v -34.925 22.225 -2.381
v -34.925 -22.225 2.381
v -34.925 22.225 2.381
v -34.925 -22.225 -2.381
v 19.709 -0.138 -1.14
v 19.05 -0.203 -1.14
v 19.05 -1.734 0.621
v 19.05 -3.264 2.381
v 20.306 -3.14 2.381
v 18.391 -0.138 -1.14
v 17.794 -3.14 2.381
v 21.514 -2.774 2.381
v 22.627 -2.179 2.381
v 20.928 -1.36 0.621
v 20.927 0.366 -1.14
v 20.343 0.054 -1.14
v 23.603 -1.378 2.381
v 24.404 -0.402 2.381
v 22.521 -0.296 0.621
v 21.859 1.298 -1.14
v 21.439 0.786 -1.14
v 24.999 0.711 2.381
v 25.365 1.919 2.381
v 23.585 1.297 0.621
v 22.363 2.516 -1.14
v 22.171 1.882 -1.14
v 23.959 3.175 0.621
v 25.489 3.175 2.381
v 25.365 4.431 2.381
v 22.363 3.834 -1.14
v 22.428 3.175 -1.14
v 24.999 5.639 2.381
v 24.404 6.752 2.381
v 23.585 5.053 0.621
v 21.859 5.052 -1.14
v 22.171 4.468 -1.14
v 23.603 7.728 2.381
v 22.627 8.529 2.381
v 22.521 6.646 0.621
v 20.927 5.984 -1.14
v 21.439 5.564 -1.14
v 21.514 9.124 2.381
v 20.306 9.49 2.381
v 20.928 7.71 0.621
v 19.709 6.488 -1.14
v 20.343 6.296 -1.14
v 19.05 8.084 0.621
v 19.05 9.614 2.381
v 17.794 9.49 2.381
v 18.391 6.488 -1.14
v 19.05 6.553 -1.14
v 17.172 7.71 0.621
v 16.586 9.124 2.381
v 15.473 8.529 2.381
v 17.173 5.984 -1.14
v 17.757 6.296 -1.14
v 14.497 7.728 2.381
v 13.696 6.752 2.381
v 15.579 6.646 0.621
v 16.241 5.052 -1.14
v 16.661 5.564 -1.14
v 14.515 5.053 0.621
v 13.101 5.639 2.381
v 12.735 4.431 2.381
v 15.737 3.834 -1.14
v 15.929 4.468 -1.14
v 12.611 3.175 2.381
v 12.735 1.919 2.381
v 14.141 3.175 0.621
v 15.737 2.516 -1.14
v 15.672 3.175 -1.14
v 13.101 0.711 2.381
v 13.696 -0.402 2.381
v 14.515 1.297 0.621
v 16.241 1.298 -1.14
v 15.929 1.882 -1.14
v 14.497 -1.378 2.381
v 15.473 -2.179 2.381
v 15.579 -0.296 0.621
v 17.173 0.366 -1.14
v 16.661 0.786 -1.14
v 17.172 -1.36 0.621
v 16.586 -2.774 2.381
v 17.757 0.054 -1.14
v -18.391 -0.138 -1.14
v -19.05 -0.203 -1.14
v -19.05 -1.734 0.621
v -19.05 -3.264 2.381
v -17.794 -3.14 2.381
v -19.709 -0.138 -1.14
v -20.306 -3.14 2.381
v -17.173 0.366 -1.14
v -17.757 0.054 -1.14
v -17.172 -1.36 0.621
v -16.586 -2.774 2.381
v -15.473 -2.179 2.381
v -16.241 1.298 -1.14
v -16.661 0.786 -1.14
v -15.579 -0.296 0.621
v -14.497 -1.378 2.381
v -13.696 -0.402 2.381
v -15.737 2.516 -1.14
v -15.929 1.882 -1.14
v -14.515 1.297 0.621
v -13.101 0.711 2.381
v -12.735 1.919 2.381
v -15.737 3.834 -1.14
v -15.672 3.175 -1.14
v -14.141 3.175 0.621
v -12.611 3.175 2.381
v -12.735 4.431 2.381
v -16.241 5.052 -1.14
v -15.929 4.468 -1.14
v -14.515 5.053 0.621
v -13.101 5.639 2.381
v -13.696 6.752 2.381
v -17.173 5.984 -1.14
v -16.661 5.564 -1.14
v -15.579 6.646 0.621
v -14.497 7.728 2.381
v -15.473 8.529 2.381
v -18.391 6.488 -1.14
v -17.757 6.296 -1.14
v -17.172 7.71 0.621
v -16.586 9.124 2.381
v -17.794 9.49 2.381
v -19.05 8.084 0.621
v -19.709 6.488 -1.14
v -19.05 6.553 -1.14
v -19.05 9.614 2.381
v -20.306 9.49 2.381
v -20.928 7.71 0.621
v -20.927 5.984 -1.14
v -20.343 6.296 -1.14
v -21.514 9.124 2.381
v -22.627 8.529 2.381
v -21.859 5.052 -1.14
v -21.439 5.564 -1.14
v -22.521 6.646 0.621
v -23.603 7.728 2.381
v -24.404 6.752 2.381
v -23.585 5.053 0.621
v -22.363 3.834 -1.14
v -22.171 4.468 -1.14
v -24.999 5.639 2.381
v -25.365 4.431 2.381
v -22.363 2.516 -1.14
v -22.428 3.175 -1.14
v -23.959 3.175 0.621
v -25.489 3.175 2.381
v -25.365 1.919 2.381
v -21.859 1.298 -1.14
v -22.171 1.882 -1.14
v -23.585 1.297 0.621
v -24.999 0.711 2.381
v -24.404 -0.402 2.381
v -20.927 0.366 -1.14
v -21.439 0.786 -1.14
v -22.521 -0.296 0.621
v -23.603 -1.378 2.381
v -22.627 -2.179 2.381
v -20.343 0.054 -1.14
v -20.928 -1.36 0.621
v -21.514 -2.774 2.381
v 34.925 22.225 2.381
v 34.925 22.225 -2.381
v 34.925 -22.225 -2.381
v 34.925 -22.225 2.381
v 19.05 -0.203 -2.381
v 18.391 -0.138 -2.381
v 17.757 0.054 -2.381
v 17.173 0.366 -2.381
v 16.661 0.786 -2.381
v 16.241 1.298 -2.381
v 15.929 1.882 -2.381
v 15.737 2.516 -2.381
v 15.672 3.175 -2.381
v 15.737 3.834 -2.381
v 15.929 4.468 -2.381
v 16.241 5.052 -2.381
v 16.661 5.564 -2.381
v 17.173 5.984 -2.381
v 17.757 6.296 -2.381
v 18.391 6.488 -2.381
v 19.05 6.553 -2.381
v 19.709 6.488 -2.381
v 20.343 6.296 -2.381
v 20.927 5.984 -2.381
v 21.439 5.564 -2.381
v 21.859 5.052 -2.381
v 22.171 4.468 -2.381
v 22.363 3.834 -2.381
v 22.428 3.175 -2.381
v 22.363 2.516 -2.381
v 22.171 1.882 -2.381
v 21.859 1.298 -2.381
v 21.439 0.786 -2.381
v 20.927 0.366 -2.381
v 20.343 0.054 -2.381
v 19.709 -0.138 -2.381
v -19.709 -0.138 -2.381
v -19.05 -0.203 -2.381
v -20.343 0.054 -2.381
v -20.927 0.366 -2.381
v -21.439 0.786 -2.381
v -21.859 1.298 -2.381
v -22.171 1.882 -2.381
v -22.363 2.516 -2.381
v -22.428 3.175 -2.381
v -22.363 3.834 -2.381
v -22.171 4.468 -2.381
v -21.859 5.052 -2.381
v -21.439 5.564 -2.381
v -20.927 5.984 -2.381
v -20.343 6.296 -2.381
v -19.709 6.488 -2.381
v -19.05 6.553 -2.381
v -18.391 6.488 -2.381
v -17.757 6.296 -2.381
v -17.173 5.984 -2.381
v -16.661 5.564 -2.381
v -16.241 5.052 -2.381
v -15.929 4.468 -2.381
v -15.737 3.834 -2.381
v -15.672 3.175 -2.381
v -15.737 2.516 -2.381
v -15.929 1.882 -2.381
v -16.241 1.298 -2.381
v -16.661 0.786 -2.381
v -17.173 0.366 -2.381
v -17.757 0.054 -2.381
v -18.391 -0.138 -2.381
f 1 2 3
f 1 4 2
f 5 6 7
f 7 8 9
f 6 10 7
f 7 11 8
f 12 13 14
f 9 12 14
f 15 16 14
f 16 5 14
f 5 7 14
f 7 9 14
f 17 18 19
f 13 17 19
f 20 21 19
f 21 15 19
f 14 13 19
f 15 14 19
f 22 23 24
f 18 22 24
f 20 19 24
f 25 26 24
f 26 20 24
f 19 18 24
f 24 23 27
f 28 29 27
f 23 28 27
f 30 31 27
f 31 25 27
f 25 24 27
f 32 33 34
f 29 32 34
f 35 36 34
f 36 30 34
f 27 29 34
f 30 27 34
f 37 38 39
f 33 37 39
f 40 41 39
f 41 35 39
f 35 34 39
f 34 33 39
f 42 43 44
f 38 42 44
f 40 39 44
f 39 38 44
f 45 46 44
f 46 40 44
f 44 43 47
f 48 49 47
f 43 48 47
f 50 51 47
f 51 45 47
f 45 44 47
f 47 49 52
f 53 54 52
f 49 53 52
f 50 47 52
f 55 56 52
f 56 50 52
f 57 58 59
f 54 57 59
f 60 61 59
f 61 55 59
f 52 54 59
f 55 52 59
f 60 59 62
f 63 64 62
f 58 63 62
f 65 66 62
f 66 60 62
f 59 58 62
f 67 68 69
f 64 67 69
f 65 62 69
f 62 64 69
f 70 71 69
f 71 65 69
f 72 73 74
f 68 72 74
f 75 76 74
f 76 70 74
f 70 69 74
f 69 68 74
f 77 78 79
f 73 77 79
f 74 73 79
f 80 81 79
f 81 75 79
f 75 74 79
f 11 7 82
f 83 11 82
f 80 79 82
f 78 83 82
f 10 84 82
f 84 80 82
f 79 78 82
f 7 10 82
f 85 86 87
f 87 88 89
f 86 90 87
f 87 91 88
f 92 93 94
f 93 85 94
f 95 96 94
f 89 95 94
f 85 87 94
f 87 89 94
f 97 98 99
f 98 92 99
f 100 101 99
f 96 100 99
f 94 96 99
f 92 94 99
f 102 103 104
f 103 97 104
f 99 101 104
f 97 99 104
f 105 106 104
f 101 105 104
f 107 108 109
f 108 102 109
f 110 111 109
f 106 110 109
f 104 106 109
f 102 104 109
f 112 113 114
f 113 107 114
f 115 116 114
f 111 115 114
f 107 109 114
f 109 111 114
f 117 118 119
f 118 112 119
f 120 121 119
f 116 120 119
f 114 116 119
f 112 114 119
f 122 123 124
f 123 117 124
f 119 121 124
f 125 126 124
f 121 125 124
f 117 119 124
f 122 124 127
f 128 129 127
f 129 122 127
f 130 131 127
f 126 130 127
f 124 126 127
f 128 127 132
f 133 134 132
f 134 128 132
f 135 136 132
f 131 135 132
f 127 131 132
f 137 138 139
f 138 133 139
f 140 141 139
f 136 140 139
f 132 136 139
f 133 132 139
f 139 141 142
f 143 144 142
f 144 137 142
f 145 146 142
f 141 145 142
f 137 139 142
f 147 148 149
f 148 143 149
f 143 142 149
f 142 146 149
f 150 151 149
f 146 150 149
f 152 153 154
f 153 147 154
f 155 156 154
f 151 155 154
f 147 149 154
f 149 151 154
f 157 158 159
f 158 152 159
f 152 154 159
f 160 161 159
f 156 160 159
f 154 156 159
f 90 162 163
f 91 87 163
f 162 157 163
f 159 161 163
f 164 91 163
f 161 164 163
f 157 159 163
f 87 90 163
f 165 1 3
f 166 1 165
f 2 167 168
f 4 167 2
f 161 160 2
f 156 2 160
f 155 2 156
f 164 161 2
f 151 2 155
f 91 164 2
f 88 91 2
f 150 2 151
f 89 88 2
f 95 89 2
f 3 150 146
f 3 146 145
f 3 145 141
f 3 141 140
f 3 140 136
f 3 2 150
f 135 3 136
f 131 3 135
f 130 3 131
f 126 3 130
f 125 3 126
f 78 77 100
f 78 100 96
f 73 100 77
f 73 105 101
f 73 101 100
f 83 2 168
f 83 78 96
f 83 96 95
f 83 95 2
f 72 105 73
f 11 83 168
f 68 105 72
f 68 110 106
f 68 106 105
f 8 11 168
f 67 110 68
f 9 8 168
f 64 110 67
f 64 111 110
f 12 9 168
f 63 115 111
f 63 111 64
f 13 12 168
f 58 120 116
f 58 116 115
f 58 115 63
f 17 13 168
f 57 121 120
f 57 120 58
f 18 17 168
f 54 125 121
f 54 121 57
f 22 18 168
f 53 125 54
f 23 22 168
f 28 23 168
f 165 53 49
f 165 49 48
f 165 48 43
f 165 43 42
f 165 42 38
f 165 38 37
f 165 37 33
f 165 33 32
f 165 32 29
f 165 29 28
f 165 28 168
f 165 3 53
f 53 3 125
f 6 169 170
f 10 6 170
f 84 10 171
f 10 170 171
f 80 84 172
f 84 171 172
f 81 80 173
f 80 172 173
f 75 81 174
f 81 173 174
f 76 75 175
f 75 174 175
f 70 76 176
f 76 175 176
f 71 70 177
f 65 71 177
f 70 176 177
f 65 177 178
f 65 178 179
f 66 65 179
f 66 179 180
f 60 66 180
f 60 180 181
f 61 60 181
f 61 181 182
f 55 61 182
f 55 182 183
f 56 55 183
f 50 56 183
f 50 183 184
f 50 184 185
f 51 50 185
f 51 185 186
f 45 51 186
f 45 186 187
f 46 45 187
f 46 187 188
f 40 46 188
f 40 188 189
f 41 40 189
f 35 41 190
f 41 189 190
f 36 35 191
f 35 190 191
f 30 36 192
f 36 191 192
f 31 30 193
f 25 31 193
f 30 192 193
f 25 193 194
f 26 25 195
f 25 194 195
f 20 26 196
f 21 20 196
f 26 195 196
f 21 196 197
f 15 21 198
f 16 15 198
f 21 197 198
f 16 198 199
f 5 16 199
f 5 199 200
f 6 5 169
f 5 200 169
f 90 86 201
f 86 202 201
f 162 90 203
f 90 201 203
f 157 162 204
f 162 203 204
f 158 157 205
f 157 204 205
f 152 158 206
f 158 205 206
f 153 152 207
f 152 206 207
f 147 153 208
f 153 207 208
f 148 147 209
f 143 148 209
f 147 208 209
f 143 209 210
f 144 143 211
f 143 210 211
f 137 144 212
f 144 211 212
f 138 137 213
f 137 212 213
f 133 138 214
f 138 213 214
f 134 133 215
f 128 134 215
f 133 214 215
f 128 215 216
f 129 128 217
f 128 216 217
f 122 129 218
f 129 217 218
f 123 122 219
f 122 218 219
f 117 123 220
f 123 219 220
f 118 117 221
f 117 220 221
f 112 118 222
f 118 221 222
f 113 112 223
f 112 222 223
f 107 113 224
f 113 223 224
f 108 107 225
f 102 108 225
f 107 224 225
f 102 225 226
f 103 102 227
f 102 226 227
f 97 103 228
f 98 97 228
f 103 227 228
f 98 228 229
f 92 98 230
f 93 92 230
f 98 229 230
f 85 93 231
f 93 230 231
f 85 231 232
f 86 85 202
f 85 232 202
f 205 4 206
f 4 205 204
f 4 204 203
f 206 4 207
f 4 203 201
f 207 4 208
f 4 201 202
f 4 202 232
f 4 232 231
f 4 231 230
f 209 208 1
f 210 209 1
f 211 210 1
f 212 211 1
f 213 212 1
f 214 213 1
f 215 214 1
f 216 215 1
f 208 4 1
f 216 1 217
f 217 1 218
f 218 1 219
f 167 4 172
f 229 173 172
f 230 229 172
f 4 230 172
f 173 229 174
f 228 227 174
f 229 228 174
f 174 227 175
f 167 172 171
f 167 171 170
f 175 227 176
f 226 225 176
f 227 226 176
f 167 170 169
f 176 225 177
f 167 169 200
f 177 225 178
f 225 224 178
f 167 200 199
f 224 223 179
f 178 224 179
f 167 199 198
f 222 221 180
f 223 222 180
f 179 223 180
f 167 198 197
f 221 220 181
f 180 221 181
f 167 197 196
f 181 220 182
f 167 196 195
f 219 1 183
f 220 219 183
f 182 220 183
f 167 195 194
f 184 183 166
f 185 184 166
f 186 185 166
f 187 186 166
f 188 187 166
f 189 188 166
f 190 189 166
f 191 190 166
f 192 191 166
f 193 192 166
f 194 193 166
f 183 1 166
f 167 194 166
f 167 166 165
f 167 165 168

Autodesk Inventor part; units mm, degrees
ref_plane "YZ Plane" through (0, 0, 0) normal (1, 0, 0) x (0, 1, 0)
ref_plane "XZ Plane" through (0, 0, 0) normal (0, 1, 0) x (-1, 0, 0)
ref_plane "XY Plane" through (0, 0, 0) normal (0, 0, 1) x (1, 0, 0)
sketch "Sketch1" plane through (0, 0, 0) normal (0, 0, 1) x (1, 0, 0)
  line L0 (-34.925, 22.225) -> (34.925, 22.225)
  line L1 (34.925, 22.225) -> (34.925, -22.225)
  line L2 (34.925, -22.225) -> (-34.925, -22.225)
  line L3 (-34.925, -22.225) -> (-34.925, 22.225)
  point P0 (0, 0)
  dimension "d0" = 69.85
  dimension "d1" = 44.45
  dimension "d2" = 34.925
  dimension "d3" = 22.225
extrude "Extrusion1" add sketch "Sketch1" along normal mid plane 4.7625
sketch "Sketch2" plane through (0, 0, 2.3813) normal (0, 0, 1) x (1, 0, 0)
  line L0 (-34.925, -22.225) -> (-34.925, 22.225) projected
  line L1 (34.925, -22.225) -> (-34.925, -22.225) projected
  point P0 (-19.05, 3.175)
  point P1 (19.05, 3.175)
  dimension "d6" = 25.4
  dimension "d7" = 15.875
  dimension "d8" = 38.1
hole "Hole1" at (-19.05, 3.175, 2.3813) at (19.05, 3.175, 2.3813) direction (0, 0, -1) diameter 6.7564 depth 19.05 tip angle 118 countersink diameter 12.8778 countersink angle 82 clearance for "Flat Head Machine Screw (82)" size "1/4" standard "Ansi Unified Screw Threads"
equation "\"d2\" = 0.5 * d0"
equation "\"d3\" = 0.5 * d1"
properties part number "Jaw_Plate" material "Steel, High Strength Low Alloy"
